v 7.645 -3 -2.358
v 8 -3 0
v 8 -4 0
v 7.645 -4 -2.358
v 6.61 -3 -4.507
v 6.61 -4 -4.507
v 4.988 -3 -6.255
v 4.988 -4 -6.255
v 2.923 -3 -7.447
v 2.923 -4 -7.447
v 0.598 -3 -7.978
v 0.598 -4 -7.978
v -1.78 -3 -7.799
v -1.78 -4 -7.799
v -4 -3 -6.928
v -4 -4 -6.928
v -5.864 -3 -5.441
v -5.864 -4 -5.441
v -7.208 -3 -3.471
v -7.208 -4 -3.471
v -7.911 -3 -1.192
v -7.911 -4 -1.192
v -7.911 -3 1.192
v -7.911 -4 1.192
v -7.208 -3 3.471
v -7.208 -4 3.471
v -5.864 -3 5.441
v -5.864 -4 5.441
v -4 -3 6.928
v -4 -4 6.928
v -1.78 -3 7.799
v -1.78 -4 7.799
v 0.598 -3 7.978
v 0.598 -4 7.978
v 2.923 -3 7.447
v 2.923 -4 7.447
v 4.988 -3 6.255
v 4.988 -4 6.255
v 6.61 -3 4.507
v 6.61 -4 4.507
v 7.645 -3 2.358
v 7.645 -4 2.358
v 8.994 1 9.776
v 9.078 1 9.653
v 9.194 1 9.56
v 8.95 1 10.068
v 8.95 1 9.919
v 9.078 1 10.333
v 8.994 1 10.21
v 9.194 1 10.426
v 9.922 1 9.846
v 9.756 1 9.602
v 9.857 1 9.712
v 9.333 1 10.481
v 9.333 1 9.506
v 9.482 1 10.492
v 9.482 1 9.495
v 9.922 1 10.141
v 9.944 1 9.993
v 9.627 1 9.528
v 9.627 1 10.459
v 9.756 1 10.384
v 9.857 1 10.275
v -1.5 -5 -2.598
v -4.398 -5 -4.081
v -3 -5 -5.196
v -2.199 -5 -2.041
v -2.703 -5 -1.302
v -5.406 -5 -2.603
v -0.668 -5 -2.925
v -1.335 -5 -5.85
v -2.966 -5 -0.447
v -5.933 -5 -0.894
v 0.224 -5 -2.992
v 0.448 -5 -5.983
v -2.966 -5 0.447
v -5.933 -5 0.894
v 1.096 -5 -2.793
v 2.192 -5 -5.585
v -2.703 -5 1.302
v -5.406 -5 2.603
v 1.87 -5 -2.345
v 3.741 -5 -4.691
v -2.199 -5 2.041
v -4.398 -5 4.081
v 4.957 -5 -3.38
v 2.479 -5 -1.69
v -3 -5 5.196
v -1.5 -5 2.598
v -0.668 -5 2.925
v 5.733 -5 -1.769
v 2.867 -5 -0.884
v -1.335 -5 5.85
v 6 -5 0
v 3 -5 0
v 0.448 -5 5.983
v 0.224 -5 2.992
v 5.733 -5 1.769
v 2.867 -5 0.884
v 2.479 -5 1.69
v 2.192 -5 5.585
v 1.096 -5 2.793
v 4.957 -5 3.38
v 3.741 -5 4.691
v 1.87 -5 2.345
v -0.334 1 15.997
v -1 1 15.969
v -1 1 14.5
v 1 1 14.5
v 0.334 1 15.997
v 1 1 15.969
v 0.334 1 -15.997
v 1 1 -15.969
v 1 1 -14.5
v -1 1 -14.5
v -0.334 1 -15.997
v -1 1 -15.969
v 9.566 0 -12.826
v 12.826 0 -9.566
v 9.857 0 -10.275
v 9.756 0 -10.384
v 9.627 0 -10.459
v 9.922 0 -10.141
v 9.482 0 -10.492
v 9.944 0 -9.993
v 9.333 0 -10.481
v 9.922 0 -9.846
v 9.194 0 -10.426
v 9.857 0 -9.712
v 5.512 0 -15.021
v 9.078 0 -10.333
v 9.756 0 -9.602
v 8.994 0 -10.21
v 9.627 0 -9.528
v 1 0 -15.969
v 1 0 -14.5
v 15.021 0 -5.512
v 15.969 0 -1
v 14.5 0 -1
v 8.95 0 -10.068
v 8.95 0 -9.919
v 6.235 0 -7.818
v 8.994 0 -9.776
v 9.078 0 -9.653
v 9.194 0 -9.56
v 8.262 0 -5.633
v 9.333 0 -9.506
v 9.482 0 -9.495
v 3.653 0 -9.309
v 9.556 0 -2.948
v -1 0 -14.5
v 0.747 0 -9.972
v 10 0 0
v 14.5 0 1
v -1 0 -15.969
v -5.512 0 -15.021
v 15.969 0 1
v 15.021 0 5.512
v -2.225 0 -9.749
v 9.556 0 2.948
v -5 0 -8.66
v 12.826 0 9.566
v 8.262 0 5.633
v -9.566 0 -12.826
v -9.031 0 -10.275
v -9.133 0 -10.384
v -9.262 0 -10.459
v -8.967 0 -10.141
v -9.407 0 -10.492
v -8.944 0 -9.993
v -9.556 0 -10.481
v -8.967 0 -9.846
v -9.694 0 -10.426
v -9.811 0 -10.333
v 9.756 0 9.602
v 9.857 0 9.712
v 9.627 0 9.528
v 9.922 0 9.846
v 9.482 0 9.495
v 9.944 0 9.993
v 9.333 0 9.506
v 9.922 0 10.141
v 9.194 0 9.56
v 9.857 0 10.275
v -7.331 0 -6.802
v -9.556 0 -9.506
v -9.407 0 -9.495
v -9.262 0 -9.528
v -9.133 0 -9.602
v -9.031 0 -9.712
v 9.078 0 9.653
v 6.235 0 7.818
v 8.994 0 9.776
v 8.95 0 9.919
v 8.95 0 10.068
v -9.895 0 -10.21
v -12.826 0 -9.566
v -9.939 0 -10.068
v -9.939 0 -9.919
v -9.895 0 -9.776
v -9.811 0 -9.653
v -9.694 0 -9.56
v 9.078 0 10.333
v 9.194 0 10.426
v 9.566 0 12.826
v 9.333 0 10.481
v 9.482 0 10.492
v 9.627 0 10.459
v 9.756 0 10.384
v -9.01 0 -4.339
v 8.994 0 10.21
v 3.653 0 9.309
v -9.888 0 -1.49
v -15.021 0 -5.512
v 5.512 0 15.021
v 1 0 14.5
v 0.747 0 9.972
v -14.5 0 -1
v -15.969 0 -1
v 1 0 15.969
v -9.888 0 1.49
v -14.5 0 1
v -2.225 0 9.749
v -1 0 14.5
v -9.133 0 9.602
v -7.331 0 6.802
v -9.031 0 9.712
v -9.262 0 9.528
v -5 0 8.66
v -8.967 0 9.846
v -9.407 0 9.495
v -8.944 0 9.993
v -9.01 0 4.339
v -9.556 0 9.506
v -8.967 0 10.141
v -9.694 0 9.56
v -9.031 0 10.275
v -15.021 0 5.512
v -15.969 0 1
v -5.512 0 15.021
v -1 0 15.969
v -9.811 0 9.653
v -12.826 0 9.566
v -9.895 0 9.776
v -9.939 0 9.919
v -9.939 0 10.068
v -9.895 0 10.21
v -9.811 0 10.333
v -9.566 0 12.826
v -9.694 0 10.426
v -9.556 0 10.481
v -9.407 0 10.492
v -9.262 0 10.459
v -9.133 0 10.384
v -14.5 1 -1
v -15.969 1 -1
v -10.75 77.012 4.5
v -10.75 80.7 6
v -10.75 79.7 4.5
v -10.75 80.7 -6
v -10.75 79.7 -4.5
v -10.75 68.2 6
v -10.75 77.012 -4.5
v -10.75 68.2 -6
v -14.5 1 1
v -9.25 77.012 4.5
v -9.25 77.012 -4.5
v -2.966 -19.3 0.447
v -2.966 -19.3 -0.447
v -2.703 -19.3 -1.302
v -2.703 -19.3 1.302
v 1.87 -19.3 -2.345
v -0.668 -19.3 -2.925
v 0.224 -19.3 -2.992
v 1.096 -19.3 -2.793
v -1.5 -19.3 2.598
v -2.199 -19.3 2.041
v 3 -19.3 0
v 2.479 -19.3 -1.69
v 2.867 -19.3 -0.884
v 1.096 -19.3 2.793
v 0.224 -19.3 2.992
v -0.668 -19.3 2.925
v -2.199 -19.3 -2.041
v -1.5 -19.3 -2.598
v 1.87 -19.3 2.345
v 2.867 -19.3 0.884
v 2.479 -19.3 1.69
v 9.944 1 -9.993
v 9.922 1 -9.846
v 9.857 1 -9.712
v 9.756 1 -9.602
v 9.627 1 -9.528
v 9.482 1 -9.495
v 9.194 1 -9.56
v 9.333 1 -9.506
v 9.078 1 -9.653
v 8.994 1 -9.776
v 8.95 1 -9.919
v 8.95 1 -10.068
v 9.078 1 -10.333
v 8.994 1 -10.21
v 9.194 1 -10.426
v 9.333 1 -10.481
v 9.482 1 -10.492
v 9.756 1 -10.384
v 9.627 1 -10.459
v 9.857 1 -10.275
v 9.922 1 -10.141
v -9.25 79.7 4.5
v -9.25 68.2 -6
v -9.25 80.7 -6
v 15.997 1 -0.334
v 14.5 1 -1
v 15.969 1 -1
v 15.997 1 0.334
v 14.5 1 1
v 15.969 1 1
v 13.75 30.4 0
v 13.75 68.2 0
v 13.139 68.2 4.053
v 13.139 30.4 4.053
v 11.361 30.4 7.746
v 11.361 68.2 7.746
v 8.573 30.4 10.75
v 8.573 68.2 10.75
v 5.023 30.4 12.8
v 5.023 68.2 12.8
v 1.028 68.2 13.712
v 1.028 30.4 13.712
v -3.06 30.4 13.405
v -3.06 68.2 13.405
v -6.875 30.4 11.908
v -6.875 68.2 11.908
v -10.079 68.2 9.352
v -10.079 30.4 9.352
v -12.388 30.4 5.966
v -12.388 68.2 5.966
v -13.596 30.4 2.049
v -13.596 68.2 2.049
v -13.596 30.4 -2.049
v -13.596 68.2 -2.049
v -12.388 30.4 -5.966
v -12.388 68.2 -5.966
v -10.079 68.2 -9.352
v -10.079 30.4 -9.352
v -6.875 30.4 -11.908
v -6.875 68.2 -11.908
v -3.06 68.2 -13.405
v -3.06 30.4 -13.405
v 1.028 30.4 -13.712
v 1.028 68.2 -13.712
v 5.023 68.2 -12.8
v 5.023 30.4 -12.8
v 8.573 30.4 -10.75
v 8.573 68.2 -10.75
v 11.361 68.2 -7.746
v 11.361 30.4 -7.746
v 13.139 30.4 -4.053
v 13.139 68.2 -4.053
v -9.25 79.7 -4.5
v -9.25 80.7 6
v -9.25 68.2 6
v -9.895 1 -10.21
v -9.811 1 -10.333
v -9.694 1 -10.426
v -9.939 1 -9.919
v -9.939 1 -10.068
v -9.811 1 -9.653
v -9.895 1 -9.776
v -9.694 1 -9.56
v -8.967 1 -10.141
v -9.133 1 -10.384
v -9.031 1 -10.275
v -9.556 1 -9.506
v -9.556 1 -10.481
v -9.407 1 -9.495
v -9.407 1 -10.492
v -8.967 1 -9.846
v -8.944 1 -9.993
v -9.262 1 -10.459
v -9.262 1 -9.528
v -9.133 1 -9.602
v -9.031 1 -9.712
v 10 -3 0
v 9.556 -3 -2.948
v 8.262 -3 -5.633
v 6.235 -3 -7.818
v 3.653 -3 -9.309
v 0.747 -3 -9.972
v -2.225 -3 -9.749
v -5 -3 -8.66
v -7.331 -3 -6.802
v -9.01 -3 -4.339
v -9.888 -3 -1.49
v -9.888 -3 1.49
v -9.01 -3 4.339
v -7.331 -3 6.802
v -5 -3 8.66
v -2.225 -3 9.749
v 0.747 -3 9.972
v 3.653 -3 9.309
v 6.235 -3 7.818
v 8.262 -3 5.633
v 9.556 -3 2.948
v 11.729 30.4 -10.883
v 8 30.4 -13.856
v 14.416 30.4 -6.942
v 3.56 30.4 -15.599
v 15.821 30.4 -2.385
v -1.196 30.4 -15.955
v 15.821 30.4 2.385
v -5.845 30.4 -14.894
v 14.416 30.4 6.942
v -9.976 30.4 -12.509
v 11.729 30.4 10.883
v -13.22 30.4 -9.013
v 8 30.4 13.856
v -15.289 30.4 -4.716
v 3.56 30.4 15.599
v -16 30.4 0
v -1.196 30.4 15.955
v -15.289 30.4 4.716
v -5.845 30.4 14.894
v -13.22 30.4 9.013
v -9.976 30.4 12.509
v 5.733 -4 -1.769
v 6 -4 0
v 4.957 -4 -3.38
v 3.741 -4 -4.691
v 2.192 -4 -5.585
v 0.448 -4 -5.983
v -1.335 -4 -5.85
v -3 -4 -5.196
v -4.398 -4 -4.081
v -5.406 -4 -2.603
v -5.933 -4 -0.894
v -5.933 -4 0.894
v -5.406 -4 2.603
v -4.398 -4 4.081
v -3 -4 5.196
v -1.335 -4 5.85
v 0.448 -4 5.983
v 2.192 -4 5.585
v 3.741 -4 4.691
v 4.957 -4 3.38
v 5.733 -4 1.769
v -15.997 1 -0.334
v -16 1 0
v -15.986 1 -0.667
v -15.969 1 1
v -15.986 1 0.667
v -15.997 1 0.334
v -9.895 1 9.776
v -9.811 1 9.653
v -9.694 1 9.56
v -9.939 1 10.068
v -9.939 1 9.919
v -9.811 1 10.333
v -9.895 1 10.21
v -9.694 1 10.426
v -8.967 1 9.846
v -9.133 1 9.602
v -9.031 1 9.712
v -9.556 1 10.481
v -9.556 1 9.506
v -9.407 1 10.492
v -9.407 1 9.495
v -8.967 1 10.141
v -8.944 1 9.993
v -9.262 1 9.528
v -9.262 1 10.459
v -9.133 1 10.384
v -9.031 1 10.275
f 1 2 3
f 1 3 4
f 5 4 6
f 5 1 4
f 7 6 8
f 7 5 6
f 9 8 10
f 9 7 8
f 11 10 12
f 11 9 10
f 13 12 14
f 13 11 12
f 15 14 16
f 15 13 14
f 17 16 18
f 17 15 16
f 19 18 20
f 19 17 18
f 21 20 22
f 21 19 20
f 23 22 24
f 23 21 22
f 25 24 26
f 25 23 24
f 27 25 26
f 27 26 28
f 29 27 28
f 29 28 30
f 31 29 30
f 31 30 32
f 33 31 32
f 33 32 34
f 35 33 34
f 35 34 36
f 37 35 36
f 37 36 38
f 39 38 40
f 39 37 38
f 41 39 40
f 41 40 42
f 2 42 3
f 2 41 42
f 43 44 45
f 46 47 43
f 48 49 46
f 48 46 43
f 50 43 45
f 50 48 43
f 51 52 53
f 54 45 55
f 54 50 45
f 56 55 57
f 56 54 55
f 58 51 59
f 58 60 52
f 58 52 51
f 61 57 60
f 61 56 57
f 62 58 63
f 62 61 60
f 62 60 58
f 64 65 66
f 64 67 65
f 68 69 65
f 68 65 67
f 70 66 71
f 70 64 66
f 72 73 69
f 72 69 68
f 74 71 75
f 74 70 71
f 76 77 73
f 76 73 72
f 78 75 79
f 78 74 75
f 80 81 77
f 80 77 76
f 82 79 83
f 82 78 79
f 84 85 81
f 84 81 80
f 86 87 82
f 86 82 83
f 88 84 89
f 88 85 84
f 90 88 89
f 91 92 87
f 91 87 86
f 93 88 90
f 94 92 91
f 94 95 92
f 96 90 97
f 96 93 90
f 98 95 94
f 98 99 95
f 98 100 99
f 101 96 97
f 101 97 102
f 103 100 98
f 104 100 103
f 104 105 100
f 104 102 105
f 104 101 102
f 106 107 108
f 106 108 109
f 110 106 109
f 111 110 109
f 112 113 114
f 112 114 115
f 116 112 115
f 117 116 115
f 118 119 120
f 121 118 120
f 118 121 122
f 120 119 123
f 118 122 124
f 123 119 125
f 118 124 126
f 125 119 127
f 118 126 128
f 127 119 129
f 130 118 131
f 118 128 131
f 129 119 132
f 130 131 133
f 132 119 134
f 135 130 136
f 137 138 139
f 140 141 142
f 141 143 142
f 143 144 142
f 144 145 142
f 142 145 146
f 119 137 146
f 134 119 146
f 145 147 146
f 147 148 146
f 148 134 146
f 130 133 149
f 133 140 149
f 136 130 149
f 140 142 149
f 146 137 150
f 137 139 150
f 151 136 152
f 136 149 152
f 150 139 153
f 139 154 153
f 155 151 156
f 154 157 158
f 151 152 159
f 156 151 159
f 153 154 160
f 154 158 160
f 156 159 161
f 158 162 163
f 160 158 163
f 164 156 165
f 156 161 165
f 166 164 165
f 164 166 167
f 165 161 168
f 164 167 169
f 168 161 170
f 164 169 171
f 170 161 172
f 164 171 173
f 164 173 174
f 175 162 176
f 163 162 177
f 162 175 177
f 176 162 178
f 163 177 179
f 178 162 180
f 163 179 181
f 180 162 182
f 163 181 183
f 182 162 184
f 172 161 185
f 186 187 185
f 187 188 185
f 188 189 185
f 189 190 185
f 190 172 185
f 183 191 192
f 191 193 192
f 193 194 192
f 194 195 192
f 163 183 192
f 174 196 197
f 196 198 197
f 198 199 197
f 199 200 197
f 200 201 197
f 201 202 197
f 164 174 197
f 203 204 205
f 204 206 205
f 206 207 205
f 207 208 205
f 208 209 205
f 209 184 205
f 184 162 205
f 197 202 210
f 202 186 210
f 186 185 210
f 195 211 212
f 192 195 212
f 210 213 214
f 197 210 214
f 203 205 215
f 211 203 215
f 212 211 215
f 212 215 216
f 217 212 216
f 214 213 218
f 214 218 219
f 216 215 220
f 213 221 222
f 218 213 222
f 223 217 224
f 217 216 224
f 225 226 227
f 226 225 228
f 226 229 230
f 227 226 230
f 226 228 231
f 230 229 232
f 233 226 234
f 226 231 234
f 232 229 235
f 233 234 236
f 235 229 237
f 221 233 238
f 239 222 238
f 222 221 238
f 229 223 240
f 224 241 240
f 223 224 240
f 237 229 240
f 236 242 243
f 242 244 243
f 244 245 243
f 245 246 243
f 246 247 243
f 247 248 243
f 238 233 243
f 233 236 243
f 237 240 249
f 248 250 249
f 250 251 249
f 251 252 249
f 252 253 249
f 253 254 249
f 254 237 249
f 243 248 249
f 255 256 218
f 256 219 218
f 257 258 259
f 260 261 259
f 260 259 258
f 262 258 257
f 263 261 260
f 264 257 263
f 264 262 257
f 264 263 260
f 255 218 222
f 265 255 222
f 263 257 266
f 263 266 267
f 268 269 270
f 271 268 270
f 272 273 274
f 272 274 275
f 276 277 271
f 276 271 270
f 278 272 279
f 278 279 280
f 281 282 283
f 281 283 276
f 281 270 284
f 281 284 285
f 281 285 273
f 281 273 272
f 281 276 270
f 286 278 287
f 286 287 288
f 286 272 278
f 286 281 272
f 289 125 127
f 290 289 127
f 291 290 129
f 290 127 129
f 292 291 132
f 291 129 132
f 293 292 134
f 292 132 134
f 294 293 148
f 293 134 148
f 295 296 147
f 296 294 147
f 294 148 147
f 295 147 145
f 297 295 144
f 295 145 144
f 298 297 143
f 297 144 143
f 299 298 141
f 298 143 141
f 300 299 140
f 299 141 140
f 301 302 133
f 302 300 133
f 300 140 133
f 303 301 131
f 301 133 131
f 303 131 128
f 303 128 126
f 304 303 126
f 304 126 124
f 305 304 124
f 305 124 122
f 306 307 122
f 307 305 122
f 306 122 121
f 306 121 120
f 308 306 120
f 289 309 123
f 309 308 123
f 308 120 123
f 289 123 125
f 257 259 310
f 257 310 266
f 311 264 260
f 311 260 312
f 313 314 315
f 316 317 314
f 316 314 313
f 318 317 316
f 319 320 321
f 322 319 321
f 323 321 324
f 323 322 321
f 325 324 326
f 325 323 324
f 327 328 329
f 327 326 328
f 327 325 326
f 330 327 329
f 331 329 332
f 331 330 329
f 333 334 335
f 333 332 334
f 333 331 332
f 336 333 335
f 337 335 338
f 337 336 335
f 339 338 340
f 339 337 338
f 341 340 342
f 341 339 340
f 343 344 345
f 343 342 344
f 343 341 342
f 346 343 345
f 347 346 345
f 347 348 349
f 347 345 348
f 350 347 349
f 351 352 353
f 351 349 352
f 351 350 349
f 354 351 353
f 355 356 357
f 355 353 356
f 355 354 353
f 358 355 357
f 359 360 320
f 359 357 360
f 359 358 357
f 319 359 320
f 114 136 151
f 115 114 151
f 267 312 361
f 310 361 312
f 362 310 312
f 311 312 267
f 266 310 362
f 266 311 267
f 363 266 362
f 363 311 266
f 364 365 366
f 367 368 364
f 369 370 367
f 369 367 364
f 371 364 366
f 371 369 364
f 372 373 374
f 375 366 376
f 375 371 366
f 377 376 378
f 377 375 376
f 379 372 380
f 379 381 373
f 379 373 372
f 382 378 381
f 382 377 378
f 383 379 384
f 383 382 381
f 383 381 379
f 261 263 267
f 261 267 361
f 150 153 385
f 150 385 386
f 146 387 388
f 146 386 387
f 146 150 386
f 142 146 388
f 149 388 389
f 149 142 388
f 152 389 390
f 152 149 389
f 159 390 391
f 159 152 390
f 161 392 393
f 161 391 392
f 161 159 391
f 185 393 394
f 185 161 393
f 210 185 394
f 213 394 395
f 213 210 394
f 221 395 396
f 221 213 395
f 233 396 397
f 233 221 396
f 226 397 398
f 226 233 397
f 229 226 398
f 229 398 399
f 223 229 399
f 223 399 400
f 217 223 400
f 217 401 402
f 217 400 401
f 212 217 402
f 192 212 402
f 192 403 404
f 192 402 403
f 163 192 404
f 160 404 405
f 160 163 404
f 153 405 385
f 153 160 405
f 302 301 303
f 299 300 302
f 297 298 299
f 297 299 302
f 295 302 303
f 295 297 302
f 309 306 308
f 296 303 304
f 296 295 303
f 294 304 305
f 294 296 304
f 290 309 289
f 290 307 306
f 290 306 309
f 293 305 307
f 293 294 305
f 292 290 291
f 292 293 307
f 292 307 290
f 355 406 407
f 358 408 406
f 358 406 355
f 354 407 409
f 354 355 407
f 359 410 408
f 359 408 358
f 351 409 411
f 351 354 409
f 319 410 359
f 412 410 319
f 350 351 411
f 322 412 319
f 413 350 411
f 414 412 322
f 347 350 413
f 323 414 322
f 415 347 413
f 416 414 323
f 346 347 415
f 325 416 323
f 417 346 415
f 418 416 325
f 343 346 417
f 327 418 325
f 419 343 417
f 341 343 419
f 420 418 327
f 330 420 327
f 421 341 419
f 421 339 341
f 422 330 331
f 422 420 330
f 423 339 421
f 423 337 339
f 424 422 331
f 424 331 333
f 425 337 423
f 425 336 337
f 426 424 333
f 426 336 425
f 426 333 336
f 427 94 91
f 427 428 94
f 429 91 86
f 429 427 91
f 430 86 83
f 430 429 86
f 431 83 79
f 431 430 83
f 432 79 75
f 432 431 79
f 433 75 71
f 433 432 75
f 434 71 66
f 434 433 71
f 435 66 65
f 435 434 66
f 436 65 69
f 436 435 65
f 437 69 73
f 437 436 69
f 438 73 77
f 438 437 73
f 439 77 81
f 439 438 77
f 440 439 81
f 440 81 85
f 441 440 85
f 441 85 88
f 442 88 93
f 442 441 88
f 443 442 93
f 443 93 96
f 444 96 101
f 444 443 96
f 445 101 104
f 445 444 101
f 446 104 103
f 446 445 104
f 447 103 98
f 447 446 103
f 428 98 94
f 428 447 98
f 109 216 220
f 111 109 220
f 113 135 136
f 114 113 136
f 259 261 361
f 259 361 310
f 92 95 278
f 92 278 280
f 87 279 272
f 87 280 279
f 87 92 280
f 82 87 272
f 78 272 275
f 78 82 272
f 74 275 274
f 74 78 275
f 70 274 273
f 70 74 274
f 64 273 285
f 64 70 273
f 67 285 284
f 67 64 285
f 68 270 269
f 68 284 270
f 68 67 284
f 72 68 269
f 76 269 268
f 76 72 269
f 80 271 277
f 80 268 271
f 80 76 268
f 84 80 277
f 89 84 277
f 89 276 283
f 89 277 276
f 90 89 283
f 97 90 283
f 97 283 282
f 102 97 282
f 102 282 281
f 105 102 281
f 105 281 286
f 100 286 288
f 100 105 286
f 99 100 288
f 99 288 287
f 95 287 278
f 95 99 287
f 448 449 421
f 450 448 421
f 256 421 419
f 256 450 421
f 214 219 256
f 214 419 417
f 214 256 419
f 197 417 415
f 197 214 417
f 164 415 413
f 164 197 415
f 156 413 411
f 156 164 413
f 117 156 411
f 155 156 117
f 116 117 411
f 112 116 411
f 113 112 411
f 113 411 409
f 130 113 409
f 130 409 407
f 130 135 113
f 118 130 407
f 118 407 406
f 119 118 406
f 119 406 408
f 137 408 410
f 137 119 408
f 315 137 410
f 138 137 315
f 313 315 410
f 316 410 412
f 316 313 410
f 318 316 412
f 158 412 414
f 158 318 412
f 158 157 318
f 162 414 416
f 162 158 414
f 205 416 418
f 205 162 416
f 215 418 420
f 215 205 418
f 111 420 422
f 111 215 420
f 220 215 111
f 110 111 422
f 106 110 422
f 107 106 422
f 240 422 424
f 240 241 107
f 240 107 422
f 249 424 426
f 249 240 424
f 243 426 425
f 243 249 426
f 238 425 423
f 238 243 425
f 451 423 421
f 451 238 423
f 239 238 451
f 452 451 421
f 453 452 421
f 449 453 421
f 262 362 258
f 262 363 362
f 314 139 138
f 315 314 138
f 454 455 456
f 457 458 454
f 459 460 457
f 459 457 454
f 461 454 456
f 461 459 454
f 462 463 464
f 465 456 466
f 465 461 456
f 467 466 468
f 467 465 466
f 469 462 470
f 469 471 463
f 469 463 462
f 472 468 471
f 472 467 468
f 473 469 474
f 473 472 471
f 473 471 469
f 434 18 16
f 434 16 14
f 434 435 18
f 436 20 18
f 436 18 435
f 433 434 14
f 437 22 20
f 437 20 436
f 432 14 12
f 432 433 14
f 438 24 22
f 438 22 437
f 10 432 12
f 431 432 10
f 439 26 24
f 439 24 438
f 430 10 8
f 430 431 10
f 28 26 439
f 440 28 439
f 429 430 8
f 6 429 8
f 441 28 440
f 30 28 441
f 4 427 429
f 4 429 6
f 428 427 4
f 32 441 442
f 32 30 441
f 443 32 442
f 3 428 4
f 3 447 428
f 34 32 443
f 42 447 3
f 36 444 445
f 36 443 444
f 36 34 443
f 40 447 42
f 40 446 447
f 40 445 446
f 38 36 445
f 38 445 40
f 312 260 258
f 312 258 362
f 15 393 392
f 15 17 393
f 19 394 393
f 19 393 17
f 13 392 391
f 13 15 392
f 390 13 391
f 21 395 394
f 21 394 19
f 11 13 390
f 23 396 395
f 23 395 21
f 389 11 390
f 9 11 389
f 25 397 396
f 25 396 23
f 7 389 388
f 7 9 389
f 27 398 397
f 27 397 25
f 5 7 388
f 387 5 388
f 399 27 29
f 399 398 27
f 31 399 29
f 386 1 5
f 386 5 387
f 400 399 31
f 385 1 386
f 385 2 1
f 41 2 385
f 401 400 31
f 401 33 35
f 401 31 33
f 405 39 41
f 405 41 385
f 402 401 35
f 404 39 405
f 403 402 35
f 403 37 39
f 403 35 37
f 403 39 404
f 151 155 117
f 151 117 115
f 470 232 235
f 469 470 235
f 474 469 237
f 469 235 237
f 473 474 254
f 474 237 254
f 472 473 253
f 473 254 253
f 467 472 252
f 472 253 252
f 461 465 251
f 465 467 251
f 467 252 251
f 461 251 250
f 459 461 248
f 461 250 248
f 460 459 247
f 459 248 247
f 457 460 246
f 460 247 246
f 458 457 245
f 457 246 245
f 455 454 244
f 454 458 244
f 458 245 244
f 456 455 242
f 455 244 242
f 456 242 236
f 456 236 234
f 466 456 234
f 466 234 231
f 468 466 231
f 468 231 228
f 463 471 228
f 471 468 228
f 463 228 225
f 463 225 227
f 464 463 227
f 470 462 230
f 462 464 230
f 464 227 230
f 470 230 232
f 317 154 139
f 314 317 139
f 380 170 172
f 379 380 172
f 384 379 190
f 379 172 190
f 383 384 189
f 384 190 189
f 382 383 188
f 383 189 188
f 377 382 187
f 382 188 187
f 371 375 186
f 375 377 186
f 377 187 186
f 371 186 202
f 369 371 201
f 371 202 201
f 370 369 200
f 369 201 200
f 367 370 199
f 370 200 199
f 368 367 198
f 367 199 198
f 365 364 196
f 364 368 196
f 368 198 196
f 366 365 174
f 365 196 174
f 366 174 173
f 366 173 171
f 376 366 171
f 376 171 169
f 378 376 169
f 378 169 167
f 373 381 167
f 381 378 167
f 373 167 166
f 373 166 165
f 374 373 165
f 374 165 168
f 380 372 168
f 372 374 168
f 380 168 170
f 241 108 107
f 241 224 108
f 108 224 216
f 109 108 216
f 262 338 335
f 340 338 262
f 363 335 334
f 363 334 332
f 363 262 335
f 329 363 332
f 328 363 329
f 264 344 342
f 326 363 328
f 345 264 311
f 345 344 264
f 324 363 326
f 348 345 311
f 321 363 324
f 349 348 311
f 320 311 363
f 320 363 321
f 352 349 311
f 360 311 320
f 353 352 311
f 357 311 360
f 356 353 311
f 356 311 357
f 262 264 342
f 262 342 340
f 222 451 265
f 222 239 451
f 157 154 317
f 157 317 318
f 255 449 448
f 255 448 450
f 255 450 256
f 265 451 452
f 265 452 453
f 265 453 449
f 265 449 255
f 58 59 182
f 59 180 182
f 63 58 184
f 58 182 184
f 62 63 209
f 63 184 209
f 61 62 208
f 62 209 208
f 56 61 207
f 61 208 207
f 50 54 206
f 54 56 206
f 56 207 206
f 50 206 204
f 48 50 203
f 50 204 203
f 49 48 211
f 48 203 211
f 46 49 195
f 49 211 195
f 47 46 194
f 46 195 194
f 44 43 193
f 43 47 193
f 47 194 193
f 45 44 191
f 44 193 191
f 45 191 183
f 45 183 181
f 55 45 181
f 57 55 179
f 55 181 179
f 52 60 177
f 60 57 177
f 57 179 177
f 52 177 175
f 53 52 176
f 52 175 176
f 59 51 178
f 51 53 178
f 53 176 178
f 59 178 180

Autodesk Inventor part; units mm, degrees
ref_plane "YZ Plane" through (0, 0, 0) normal (1, 0, 0) x (0, 1, 0)
ref_plane "XZ Plane" through (0, 0, 0) normal (0, 1, 0) x (-1, 0, 0)
ref_plane "XY Plane" through (0, 0, 0) normal (0, 0, 1) x (1, 0, 0)
sketch "Sketch1" plane through (0, 0, 0) normal (0, 1, 0) x (-1, 0, 0)
  circle A0 centre (0, 0) radius 16
  dimension "d0" = 32
extrude "Extrusion1" add sketch "Sketch1" along normal blind 30.4
sketch "Sketch2" plane through (0, 30.4, 0) normal (0, 1, 0) x (1, 0, 0)
  circle A0 centre (0, 0) radius 13.75
  dimension "d3" = 27.5
extrude "Extrusion2" add sketch "Sketch2" along normal blind 37.8
sketch "Sketch3" plane through (0, 0, 0) normal (0, -1, 0) x (1, 0, 0)
  circle A0 centre (0, 0) radius 10
  dimension "d6" = 20
extrude "Extrusion3" add sketch "Sketch3" along normal blind 3
sketch "Sketch4" plane through (0, -3, 0) normal (0, -1, 0) x (1, 0, 0)
  circle A0 centre (0, 0) radius 8
  dimension "d9" = 16
extrude "Extrusion4" add sketch "Sketch4" along normal blind 1
sketch "Sketch5" plane through (0, -4, 0) normal (0, -1, 0) x (1, 0, 0)
  circle A0 centre (0, 0) radius 6
  dimension "d12" = 12
extrude "Extrusion5" add sketch "Sketch5" along normal blind 1
sketch "Sketch6" plane through (0, -5, 0) normal (0, -1, 0) x (1, 0, 0)
  circle A0 centre (0, 0) radius 3
  dimension "d15" = 6
extrude "Extrusion6" add sketch "Sketch6" along normal blind 14.3
sketch "Sketch7" plane through (0, 68.2, 0) normal (0, 1, 0) x (1, 0, 0)
  line L0 (-9.25, -6) -> (-10.75, -6)
  line L1 (-10.75, -6) -> (-10.75, 6)
  line L2 (-10.75, 6) -> (-9.25, 6)
  line L3 (-9.25, 6) -> (-9.25, -6)
  circle A0 centre (0, 0) radius 10 projected
  line L4 (-9.25, -6) -> (-10.75, 6) construction
  line L5 (-10.75, -6) -> (-9.25, 6) construction
  point P0 (-10, 0)
  dimension "d18" = 12
  dimension "d19" = 1.5
extrude "Extrusion7" add sketch "Sketch7" along normal blind 12.5 contours L0 L1 L2 L3 A0 | A0 L3 picked at (-9.4369, 0.6455)
sketch "Sketch8" plane through (-10.75, 68.2, -6) normal (-1, 0, 0) x (0, 0, 1)
  line L0 (1.5, 11.5) -> (10.5, 11.5)
  line L1 (10.5, 11.5) -> (10.5, 8.812)
  line L2 (10.5, 8.812) -> (1.5, 8.812)
  line L3 (1.5, 8.812) -> (1.5, 11.5)
  line L4 (0, 12.5) -> (12, 12.5) projected
  line L5 (0, 0) -> (0, 12.5) projected
  line L6 (12, 0) -> (12, 12.5) projected
  point P0 (6, -68.2)
  dimension "d22" = 1
  dimension "d23" = 1.5
  dimension "d24" = 1.5
extrude "Extrusion8" cut sketch "Sketch8" against normal through all
sketch "Sketch9" plane through (0, 0, 0) normal (0, -1, 0) x (1, 0, 0)
  circle A0 centre (0, 0) radius 13.75 projected
  line L0 (-9.4443, 9.9933) -> (9.4443, 9.9933)
  line L1 (9.4443, 9.9933) -> (9.4443, -9.9933)
  line L2 (9.4443, -9.9933) -> (-9.4443, -9.9933)
  line L3 (-9.4443, -9.9933) -> (-9.4443, 9.9933)
  line L4 (-9.4443, 9.9933) -> (9.4443, -9.9933) construction
  line L5 (9.4443, 9.9933) -> (-9.4443, -9.9933) construction
  circle A1 centre (9.4443, -9.9933) radius 0.5
  circle A2 centre (-9.4443, -9.9933) radius 0.5
  circle A3 centre (-9.4443, 9.9933) radius 0.5
  circle A4 centre (9.4443, 9.9933) radius 0.5
  dimension "d27" = 1
  dimension "d28" = 1
  dimension "d29" = 1
  dimension "d30" = 1
extrude "Extrusion9" cut sketch "Sketch9" against normal blind 1 contours A4 L1 A0 | A0 A4 | A1 A0 | A0 L1 A1 | L0 A4 A0 | L1 A4 L0 | L2 A1 L1 | A0 A1 L2 | A3 L0 A0 | A0 A3 | A3 L3 L0 | A2 A0 | A0 L2 A2 | L2 L3 A2 | L3 A3 A0 | A0 A2 L3
sketch "Sketch10" plane through (0, 0, 0) normal (0, -1, 0) x (1, 0, 0)
  circle A0 centre (0, 0) radius 16 projected
  line L0 (0, 16) -> (0, 14.5)
  line L1 (0, 14.5) -> (-1, 14.5)
  line L2 (-1, 14.5) -> (-1, 16)
  line L3 (-1, 16) -> (0, 16)
  line L4 (0, 16) -> (0, 14.5)
  line L5 (0, 14.5) -> (1, 14.5)
  line L6 (1, 14.5) -> (1, 16)
  line L7 (1, 16) -> (0, 16)
  dimension "d33" = 1
  dimension "d34" = 1
  dimension "d35" = 1.5
extrude "Extrusion10" cut sketch "Sketch10" against normal blind 1 contours L6 L5 L0 A0 | A0 L7 L6 | L2 L3 A0 | A0 L0 L1 L2
mirror "Mirror1" about plane through (0, 0, 0) normal (0, 0, 1) of "Extrusion10"
sketch "Sketch11" plane through (0, 0, 0) normal (0, -1, 0) x (1, 0, 0)
  arc A0 (1, -15.9687) -> (1, 15.9687) centre (0, 0) ccw projected
  line L0 (16, 0) -> (14.5, 0)
  line L1 (14.5, 0) -> (14.5, 1)
  line L2 (14.5, 1) -> (16, 1)
  line L3 (16, 1) -> (16, 0)
  line L4 (16, 0) -> (14.5, 0)
  line L5 (14.5, 0) -> (14.5, -1)
  line L6 (14.5, -1) -> (16, -1)
  line L7 (16, -1) -> (16, 0)
  dimension "d38" = 1
  dimension "d39" = 1
  dimension "d40" = 1.5
extrude "Extrusion11" cut sketch "Sketch11" against normal blind 1
mirror "Mirror2" about plane through (0, 0, 0) normal (1, 0, 0) of "Extrusion11"
properties part number "CorrectMotor_CAD_spencermical_enes100OSVproject_4-50pm-3-3-16-thursday-freshmanyear-springsemester"
